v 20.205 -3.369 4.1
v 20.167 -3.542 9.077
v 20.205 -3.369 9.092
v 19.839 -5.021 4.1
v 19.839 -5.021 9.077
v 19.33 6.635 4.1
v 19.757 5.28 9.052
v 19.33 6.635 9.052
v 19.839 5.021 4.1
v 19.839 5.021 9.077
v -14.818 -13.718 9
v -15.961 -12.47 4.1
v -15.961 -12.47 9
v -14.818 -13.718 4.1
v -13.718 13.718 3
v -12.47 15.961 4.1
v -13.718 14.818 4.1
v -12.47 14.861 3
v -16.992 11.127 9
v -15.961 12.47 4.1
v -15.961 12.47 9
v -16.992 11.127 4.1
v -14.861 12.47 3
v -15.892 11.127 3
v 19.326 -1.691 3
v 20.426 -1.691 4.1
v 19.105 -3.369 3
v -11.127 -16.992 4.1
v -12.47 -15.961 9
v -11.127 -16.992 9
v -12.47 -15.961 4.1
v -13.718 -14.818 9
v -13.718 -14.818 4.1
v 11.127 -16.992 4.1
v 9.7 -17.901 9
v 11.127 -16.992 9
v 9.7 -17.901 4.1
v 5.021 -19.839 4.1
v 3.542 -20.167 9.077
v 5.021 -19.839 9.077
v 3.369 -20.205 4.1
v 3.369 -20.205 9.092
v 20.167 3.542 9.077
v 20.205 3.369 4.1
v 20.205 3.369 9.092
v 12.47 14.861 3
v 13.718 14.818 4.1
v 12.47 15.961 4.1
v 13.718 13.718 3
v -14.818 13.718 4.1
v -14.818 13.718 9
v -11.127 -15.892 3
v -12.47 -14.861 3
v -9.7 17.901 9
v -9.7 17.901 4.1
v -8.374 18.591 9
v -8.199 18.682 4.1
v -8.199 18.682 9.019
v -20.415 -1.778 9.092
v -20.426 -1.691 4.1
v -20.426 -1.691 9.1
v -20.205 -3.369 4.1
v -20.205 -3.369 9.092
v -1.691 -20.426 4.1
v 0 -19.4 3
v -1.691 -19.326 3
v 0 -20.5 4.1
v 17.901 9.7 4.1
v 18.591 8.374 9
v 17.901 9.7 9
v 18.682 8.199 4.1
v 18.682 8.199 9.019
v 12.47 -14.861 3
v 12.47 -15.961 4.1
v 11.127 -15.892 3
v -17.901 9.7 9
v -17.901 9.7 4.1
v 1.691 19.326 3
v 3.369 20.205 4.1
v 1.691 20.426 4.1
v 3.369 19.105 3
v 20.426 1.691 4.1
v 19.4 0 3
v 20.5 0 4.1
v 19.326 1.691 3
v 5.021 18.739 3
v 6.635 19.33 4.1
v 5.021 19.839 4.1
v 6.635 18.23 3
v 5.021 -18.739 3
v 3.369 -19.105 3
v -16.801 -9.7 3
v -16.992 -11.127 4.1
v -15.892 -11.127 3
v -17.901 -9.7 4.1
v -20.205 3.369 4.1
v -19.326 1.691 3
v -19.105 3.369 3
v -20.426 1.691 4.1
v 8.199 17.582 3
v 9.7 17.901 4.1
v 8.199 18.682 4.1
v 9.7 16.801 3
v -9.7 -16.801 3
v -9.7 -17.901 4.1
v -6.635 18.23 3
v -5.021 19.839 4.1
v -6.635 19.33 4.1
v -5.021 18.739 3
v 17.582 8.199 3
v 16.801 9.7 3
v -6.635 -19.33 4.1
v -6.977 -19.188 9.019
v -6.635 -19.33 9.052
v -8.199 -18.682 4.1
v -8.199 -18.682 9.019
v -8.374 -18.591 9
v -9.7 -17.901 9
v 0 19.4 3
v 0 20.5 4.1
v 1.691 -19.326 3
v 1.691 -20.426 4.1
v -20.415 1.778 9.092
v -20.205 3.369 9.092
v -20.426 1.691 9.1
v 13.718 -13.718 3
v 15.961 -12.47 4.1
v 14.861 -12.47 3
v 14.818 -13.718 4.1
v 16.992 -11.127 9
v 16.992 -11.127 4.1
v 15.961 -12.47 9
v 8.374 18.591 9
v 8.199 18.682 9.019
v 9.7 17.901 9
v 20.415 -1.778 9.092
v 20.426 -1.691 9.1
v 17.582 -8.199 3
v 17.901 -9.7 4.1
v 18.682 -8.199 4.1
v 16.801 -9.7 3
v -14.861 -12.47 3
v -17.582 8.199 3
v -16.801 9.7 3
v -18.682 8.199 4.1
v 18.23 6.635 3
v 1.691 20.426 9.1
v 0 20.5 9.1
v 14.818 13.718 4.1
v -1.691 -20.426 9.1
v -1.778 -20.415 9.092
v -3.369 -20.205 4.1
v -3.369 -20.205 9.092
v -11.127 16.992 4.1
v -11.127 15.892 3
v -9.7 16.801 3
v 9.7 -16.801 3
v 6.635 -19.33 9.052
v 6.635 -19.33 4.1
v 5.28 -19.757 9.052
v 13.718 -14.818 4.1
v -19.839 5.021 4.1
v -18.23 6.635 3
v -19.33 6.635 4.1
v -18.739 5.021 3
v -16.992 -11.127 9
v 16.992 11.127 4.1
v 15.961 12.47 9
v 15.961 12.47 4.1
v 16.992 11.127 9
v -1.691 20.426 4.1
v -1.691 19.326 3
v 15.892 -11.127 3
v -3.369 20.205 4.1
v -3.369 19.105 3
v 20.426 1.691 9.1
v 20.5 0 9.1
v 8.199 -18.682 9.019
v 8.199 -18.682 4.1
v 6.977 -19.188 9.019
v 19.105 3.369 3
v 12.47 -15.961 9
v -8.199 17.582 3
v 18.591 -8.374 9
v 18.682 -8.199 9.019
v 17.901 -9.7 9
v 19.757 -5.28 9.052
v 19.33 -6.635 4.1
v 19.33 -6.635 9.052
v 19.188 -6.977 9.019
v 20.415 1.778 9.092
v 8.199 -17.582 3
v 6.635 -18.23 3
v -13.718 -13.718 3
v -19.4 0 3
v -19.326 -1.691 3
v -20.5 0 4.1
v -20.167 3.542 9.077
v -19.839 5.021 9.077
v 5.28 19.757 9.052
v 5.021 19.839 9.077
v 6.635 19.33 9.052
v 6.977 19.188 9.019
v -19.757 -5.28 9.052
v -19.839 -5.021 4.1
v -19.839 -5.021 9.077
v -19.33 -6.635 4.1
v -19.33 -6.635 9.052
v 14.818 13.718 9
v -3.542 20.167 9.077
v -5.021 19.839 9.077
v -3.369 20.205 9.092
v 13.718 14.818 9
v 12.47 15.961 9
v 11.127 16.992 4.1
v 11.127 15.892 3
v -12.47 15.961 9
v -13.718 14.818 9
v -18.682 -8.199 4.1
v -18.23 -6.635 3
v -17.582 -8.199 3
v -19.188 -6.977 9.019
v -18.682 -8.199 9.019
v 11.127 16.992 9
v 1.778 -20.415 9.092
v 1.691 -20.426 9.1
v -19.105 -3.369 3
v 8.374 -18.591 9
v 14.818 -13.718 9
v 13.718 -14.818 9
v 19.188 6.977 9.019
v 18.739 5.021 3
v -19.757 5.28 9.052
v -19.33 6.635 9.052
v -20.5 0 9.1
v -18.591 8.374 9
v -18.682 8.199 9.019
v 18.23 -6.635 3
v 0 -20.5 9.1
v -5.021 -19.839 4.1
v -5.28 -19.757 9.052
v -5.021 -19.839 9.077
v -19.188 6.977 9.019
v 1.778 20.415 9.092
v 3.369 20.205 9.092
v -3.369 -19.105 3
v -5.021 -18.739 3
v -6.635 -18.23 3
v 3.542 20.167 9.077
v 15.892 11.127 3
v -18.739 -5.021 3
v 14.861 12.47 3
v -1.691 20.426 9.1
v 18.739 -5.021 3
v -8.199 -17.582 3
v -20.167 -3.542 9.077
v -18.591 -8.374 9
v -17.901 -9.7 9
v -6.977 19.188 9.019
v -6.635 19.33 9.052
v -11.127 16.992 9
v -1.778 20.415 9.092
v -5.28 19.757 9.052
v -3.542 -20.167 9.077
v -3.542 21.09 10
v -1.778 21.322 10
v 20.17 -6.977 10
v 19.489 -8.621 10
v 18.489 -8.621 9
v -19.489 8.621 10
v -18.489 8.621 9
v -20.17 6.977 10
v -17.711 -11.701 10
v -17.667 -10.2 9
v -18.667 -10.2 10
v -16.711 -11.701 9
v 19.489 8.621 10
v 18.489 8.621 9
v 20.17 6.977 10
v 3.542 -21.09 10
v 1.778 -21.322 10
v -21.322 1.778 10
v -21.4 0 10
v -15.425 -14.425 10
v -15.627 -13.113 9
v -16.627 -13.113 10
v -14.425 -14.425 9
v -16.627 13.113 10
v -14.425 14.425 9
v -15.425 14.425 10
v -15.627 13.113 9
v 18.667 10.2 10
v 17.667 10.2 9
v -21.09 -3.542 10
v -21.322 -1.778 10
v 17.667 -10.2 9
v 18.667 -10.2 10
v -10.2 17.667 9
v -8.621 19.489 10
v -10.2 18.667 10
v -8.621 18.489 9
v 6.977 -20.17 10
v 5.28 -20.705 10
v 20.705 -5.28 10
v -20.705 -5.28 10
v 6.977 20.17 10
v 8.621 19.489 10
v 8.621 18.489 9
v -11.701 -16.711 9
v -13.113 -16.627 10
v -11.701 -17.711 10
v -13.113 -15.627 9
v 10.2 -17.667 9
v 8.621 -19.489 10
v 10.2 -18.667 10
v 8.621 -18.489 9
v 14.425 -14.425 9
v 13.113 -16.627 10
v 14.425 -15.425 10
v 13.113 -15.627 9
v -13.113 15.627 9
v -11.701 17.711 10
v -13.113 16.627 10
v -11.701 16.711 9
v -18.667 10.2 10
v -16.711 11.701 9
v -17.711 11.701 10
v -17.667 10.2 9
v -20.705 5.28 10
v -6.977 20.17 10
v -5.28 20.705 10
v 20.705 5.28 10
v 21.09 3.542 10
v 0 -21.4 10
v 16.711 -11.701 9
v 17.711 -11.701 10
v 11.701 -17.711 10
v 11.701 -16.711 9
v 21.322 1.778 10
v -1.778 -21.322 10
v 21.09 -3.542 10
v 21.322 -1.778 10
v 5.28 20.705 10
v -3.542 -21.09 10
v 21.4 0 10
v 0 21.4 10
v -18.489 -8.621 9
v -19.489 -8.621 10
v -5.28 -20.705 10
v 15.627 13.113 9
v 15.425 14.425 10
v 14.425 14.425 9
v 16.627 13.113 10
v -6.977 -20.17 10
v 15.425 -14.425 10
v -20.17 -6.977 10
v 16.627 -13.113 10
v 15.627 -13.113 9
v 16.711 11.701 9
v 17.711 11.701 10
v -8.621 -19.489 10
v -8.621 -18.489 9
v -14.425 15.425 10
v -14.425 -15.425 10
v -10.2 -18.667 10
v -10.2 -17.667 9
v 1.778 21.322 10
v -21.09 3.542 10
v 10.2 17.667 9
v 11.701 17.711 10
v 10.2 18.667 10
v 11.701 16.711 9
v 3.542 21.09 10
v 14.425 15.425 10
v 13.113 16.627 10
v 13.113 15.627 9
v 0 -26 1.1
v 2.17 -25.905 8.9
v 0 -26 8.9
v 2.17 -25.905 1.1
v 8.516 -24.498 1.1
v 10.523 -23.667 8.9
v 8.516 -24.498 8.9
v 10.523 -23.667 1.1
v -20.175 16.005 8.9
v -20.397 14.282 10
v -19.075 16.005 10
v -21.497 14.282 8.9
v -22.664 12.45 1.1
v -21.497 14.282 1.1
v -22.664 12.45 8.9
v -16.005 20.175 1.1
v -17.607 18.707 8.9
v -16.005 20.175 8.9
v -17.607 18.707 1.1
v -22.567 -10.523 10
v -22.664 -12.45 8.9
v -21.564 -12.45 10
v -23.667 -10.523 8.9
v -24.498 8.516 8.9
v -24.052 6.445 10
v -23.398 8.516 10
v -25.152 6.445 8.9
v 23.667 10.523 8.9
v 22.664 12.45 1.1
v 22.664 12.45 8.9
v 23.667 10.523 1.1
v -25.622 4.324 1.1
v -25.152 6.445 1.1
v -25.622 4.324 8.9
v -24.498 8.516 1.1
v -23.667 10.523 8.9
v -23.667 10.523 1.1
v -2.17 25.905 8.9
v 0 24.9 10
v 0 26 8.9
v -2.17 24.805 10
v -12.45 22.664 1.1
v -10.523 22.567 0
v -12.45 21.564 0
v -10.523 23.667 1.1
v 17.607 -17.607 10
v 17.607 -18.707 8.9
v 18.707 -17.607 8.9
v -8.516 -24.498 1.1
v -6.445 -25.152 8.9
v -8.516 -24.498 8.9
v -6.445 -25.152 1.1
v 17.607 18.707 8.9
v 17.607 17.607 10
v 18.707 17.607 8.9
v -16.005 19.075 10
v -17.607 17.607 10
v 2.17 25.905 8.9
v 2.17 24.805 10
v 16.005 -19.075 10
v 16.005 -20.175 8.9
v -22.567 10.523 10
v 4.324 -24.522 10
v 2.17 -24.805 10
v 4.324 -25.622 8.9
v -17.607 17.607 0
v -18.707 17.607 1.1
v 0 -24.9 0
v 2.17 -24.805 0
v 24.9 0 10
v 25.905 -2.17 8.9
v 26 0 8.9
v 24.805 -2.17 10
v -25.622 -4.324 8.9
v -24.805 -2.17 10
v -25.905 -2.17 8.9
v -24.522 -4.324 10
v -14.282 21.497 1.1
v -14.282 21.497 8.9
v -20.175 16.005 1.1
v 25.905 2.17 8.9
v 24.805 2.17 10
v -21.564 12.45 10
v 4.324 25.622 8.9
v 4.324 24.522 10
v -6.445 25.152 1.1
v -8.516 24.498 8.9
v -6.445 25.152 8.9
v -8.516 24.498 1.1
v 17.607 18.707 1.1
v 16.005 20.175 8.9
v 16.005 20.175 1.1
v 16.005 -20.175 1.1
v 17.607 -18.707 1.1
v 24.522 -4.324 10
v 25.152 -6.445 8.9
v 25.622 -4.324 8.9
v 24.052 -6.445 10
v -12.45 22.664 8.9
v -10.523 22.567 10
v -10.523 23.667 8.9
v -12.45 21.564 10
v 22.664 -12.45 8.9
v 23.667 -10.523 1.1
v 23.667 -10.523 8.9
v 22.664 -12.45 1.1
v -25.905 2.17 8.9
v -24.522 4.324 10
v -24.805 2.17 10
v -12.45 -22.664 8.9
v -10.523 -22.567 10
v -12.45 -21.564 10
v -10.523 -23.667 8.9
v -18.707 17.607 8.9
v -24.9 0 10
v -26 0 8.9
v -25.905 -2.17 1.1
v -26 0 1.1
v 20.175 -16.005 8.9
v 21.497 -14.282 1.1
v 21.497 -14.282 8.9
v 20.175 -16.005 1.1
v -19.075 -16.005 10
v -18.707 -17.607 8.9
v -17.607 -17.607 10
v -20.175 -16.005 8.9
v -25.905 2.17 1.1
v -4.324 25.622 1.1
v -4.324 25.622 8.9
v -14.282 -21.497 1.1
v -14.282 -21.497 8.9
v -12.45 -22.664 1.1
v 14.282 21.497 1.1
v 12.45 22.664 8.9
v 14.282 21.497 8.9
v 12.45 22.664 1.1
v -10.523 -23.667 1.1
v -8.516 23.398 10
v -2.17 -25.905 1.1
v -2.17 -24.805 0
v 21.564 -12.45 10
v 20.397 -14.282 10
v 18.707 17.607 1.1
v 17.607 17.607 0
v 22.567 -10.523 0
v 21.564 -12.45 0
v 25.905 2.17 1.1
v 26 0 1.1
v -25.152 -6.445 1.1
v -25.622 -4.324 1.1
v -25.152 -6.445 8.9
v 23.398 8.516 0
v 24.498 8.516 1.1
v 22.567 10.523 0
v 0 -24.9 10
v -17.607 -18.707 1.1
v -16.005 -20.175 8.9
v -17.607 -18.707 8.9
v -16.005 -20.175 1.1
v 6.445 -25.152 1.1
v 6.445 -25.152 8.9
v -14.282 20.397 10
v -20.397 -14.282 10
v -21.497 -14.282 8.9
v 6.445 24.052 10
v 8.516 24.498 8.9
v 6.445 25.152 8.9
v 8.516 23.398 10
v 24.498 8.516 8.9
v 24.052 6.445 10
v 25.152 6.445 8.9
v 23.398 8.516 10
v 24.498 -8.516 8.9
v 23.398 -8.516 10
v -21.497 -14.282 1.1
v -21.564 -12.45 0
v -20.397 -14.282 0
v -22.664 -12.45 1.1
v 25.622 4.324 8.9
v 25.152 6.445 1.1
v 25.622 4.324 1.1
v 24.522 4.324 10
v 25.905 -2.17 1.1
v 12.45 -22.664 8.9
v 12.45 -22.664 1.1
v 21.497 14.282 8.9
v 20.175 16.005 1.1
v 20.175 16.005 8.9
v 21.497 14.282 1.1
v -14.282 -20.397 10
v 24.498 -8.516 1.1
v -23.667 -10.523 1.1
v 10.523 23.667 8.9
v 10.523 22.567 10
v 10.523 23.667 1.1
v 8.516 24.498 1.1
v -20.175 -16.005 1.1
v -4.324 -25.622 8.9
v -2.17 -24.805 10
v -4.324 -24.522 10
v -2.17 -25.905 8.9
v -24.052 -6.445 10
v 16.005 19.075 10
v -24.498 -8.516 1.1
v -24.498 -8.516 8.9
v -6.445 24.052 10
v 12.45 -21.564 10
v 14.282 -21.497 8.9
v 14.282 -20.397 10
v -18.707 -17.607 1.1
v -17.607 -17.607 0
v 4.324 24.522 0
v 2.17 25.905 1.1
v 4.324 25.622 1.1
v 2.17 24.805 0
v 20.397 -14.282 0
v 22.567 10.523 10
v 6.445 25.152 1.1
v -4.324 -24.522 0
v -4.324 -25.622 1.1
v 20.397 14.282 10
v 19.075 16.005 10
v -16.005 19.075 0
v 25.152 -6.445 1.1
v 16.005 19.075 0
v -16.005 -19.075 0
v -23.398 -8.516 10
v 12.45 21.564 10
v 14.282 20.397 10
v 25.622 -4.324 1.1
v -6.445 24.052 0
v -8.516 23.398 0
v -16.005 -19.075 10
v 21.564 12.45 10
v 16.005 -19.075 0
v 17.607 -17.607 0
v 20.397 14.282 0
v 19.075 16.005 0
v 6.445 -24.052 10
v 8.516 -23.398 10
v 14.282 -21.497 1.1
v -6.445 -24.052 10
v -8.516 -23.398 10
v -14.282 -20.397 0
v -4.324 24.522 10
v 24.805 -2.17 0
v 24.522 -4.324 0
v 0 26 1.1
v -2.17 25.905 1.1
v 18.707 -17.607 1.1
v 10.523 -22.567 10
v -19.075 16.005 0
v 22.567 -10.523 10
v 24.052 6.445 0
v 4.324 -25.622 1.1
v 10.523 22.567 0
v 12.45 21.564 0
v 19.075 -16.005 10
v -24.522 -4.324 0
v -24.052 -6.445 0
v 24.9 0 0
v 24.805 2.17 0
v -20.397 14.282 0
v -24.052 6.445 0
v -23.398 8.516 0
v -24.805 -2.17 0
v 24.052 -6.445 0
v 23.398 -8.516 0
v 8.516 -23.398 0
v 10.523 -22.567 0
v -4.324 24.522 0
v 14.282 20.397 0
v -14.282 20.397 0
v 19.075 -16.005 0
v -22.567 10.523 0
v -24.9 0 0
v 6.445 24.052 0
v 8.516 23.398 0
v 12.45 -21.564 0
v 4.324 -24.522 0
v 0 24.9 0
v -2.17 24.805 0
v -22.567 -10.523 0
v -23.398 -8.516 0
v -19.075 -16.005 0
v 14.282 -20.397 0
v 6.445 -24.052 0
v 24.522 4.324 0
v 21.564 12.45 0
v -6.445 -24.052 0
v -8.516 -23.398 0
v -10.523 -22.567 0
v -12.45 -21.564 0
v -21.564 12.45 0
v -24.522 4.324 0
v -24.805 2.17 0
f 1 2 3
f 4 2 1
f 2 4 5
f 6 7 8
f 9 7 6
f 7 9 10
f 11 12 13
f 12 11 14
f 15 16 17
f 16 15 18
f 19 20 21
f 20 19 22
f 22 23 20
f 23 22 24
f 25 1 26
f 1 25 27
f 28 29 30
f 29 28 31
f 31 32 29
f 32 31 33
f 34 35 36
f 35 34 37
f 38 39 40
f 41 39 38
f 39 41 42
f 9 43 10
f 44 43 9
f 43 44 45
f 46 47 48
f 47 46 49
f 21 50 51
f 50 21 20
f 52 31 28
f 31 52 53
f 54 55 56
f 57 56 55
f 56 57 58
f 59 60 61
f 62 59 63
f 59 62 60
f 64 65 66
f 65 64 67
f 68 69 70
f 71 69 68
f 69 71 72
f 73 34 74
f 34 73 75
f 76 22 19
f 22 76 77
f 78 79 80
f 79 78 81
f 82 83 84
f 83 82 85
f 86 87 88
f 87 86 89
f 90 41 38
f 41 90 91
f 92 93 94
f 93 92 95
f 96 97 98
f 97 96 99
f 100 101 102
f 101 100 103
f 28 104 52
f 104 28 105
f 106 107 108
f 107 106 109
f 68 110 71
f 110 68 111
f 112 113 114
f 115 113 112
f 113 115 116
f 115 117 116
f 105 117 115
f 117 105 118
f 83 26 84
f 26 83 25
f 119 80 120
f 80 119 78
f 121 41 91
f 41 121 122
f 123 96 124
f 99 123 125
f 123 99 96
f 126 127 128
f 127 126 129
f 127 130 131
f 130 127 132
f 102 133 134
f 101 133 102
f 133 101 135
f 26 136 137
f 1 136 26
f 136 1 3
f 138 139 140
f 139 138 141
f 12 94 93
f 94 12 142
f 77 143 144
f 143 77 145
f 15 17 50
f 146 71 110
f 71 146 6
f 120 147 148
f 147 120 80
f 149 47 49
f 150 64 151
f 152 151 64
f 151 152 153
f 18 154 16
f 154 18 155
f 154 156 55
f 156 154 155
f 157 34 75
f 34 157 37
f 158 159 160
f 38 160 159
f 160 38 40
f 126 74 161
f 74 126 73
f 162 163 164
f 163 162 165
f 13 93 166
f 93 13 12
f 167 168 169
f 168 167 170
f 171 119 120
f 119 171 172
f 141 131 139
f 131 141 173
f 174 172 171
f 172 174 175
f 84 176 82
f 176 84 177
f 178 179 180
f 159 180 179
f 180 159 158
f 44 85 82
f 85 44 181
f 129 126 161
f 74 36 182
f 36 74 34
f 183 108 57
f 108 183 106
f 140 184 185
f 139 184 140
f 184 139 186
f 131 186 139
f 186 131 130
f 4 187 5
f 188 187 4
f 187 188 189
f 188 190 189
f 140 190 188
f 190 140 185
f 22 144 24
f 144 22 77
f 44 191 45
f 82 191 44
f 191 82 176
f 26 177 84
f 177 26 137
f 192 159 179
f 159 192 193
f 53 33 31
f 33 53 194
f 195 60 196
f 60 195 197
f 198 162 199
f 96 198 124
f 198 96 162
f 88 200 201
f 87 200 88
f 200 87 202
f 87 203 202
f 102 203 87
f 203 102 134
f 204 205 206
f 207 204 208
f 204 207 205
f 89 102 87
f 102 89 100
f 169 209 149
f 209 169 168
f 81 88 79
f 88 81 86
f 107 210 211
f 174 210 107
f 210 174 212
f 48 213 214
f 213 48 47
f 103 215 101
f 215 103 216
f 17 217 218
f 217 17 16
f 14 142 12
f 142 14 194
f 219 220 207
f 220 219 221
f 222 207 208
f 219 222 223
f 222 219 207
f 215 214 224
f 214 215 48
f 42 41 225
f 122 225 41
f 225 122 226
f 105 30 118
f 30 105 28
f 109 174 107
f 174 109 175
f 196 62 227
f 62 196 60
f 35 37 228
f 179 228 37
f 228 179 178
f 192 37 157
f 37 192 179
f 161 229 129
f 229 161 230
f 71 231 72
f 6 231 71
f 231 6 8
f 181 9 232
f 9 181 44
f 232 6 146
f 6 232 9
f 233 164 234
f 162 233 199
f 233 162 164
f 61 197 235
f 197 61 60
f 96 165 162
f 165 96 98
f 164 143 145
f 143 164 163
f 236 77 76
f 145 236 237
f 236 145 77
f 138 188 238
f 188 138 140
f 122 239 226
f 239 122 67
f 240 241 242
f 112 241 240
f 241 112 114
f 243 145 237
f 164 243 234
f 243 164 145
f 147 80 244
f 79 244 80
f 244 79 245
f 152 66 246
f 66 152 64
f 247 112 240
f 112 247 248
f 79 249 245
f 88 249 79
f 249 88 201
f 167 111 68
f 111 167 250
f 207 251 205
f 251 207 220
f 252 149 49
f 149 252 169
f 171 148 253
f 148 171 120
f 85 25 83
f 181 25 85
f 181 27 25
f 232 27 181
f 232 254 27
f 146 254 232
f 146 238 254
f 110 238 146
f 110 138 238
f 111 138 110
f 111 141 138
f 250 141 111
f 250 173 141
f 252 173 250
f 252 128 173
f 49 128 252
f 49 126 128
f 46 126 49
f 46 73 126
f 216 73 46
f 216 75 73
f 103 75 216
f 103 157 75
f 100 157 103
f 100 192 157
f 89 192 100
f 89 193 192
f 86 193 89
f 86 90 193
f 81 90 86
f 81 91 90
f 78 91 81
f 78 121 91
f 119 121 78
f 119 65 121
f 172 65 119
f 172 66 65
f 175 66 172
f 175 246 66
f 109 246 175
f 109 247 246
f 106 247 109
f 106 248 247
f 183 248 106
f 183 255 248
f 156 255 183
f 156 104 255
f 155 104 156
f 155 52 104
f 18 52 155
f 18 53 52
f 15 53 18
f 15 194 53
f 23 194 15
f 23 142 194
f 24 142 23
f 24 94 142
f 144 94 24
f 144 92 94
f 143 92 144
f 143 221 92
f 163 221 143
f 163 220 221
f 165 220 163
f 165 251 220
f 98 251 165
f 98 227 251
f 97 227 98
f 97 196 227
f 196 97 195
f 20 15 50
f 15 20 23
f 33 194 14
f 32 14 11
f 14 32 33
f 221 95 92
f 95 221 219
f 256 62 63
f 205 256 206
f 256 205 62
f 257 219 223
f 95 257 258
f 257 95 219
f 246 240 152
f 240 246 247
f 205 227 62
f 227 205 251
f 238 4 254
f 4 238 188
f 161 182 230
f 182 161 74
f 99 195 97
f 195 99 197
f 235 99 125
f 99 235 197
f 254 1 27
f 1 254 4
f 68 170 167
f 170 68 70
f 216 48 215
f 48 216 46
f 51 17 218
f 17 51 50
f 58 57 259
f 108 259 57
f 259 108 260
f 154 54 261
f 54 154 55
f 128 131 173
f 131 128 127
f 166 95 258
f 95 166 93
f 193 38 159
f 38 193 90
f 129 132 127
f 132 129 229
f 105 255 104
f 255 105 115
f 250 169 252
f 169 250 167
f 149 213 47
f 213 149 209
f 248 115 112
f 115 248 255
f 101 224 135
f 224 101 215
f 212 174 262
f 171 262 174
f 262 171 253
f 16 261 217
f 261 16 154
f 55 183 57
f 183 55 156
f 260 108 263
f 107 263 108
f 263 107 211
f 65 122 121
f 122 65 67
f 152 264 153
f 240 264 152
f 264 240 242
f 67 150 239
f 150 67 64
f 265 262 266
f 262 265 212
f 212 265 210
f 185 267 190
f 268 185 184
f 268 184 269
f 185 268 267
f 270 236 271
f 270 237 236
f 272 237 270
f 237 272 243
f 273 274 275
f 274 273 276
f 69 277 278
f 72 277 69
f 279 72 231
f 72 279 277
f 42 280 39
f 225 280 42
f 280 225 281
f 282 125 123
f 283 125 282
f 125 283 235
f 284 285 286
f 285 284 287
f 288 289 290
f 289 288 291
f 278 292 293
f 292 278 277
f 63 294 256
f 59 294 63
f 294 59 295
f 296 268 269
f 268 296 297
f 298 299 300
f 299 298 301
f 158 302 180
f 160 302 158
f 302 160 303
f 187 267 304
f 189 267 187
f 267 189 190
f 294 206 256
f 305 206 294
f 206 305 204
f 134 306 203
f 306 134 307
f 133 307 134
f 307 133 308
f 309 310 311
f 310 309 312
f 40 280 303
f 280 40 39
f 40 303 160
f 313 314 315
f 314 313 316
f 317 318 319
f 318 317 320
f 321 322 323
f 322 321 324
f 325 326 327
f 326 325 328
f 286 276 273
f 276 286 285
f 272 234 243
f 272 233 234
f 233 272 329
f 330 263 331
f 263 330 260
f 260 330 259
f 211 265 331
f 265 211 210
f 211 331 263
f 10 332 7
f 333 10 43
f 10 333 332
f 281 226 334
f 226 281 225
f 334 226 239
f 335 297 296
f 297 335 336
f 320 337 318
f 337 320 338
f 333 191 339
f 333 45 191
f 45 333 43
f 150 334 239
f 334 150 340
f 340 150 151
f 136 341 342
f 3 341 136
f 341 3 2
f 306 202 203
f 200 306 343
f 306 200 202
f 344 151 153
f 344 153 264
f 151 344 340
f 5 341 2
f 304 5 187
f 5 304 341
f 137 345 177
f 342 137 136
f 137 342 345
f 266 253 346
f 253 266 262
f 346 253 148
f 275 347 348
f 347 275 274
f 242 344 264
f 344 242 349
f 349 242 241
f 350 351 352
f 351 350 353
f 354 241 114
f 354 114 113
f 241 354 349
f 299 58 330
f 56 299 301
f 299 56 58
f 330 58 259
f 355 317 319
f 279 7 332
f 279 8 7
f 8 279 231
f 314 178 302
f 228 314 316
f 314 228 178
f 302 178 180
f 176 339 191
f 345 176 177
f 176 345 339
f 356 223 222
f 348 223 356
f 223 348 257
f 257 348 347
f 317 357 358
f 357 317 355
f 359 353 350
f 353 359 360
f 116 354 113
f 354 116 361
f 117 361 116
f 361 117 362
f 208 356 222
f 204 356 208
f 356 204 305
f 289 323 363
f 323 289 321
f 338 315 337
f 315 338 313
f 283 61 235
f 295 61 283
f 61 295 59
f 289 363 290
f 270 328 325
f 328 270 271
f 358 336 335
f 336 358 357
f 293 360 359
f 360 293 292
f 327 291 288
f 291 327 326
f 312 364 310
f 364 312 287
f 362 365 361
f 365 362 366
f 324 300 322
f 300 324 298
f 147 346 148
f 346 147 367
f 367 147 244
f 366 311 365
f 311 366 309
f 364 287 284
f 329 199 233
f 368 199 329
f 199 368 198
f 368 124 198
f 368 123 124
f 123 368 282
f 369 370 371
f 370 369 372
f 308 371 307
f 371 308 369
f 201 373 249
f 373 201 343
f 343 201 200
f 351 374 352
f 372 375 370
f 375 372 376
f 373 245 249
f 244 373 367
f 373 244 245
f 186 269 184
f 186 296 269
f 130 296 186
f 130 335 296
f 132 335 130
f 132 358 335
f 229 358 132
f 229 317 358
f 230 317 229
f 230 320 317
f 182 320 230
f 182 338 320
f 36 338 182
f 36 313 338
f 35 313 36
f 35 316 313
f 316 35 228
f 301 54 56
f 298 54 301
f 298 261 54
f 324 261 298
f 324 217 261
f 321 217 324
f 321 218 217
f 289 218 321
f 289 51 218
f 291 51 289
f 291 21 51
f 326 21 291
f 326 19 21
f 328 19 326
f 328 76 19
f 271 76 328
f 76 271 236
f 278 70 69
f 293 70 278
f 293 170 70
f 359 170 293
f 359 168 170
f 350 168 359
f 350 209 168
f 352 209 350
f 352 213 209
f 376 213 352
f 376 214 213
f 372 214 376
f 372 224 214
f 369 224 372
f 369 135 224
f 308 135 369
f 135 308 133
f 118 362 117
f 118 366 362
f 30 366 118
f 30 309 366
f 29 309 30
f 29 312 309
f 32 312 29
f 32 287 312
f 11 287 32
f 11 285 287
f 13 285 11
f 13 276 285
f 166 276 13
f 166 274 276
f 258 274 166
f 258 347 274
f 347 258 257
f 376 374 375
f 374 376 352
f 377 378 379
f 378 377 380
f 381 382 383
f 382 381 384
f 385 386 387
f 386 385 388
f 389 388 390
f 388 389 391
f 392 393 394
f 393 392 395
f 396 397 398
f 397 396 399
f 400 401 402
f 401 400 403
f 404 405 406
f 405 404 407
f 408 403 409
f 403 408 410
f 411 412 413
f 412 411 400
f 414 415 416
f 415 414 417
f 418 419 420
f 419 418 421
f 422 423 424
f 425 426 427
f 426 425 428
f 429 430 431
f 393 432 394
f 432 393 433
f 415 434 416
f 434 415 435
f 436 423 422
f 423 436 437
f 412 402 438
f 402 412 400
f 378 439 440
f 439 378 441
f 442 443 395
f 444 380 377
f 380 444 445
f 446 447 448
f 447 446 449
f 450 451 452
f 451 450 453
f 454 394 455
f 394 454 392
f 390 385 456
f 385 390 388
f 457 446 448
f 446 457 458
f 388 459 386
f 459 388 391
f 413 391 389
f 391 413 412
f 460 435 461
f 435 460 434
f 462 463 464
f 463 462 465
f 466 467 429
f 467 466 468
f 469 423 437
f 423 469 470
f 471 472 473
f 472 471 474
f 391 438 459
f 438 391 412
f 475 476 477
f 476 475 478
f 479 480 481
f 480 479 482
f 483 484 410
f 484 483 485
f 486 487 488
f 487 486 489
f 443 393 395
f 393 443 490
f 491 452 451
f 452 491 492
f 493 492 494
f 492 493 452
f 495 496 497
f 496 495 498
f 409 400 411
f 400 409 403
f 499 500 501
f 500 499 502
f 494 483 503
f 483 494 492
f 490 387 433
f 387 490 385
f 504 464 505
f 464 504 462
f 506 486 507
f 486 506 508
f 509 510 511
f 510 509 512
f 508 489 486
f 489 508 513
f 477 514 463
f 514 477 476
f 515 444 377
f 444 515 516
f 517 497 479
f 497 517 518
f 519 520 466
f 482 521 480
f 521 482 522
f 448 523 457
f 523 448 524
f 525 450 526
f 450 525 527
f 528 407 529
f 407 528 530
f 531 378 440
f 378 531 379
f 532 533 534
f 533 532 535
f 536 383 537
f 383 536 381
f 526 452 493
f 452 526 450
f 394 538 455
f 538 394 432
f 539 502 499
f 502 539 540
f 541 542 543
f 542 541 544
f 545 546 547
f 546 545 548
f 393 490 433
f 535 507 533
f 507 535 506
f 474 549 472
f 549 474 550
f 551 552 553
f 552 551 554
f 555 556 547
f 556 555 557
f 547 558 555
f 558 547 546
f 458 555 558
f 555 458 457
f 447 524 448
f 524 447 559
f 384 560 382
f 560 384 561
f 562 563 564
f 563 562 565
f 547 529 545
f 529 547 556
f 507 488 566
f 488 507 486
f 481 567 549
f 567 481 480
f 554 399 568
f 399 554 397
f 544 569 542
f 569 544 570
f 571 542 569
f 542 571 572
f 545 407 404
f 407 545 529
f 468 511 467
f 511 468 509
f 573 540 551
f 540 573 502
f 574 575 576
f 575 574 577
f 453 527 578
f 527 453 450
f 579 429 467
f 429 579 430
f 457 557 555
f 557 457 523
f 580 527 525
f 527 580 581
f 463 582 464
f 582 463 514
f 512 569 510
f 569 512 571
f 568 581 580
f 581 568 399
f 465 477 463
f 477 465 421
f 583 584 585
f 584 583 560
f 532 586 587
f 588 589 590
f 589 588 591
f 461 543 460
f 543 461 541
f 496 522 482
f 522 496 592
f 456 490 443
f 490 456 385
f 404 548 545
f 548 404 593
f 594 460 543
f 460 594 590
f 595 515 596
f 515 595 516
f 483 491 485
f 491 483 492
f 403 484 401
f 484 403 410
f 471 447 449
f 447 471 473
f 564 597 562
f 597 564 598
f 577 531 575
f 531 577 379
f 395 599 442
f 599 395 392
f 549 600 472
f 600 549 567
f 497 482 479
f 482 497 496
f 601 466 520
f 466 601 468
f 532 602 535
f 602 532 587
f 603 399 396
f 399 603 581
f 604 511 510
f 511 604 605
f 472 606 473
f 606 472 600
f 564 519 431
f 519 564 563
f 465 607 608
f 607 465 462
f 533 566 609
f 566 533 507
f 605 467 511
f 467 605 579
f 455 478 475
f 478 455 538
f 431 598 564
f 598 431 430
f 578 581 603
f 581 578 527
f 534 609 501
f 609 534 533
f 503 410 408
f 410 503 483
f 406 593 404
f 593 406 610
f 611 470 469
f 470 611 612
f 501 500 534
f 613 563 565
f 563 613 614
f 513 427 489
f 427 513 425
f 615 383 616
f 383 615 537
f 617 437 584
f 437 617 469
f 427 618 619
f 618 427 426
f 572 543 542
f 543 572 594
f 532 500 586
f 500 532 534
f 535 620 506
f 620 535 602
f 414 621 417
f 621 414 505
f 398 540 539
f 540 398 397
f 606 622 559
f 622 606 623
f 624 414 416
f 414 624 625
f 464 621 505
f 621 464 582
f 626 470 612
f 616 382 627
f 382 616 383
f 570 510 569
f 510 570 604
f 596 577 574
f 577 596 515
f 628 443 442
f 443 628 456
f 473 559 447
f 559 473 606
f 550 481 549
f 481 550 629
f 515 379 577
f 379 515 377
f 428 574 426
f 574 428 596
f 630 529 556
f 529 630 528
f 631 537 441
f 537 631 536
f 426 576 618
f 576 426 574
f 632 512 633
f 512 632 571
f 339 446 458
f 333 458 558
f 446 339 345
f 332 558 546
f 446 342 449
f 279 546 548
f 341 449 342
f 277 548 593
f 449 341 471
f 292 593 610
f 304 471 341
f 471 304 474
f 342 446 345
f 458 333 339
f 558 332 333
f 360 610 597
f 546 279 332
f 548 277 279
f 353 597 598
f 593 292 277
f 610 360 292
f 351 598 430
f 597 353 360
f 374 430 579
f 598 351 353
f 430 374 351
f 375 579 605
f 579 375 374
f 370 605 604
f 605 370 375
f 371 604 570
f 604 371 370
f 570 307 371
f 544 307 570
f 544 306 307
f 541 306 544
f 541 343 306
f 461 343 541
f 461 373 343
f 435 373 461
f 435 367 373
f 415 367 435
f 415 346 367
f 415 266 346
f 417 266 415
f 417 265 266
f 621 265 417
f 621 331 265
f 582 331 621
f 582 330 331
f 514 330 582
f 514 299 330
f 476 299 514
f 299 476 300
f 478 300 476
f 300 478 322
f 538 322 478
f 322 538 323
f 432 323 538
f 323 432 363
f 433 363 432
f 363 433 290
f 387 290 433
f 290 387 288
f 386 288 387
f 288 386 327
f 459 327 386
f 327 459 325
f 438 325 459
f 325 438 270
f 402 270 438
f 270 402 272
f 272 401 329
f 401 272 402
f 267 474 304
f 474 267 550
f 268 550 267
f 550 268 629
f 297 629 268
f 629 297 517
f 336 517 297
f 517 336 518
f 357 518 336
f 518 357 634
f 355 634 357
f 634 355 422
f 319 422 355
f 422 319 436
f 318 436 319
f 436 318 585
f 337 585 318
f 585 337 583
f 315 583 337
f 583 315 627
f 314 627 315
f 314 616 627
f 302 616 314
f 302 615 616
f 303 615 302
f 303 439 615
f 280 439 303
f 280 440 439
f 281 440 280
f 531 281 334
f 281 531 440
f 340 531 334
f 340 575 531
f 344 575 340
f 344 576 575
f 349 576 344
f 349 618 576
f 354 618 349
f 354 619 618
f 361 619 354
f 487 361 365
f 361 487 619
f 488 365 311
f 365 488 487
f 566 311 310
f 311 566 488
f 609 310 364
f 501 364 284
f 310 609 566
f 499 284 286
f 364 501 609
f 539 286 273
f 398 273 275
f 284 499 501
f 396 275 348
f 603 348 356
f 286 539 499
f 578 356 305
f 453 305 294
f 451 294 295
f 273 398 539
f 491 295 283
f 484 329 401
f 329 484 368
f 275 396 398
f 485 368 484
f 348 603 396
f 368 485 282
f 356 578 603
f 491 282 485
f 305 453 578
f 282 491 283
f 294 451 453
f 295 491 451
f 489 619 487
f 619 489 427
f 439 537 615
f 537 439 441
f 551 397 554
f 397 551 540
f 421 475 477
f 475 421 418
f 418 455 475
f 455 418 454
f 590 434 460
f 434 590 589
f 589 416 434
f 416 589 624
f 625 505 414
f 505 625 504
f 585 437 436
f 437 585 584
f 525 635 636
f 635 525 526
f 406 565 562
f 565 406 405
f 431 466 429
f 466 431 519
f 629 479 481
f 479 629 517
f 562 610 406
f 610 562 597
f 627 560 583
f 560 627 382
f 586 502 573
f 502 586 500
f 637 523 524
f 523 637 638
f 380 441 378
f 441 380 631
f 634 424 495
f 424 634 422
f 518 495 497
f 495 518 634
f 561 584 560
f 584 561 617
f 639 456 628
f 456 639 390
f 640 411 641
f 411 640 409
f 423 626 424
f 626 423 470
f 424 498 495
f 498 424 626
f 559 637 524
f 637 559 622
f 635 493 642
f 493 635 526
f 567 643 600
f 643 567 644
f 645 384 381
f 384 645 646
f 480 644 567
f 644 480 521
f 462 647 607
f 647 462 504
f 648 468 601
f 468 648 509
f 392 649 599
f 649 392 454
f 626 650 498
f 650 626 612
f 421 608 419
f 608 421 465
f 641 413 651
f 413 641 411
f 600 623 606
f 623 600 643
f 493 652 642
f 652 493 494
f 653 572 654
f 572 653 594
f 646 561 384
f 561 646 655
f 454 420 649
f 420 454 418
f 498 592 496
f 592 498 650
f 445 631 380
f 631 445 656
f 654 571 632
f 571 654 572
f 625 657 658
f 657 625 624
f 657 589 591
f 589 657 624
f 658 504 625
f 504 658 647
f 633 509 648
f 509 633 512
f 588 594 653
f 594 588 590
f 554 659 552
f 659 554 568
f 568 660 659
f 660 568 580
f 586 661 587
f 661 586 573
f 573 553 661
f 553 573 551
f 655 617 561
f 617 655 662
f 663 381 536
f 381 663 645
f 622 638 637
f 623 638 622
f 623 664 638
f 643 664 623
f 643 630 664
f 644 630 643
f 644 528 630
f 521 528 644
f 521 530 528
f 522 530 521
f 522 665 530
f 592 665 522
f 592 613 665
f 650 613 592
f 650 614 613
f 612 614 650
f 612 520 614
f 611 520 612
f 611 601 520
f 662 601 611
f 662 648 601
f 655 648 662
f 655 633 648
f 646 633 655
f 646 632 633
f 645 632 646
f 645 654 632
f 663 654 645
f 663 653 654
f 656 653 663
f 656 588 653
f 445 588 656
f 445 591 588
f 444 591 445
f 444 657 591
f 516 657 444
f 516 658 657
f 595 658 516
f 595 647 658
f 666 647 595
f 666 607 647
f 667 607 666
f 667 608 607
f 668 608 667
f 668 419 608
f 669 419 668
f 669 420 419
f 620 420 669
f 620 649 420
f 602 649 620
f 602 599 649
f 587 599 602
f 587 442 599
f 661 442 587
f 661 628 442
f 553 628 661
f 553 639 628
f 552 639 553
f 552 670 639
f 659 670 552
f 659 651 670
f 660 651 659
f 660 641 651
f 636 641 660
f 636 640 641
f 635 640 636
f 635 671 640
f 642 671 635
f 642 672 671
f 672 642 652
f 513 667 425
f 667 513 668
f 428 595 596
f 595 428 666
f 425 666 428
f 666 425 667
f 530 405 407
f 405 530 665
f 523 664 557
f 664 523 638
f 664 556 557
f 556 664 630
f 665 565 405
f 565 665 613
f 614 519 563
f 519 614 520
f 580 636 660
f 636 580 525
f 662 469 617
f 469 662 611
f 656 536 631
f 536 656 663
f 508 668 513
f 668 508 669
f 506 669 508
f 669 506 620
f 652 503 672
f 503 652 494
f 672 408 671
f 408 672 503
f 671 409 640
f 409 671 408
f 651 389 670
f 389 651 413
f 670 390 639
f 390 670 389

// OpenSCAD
// file: common.scad
// Unless otherwise specified, each resulting shape is
// resting on the XY plane, centered on the Z axis.

// A small amount to make sure shapes overlap when needed. This
// is well below the resolution of my 3D printer, so it
// shouldn't affect the final result.
eps = 0.001;

// High quality for printing.
$fa = 5;
$fs = 0.4;

module repeatx(n, spacing) {
  for (i = [1:n])
    translate([(i-1)*spacing, 0, 0])
      children();
}

module repeaty(n, spacing) {
  for (i = [1:n])
    translate([0, (i-1)*spacing, 0])
      children();
}

// A square pyramid, 1mm wide and 0.5mm tall. Each side of
// the base is centered on an axis.
module pyramid() {
  linear_extrude(0.5, scale=0)
    square(1, center=true);
}

// A regular octahedron centered on the origin with its
// vertices on the axes. 'axis' gives its full length along
// each axis.
module octahedron(axis) {
  // Top and bottom halves.
  for (a = [-1, 1])
    scale([1, 1, a])
      // Extrude a square into a pyramid.
      linear_extrude(axis/2, scale=0)
        rotate([0, 0, 45])
          square(norm([axis/2, axis/2]), center=true);
}

// 'd' is the outer dimensions of the box.
module chamfered_box(d, chamfer=0.5) {
  assert(d.x >= chamfer*2);
  assert(d.y >= chamfer*2);
  assert(d.z >= chamfer*2);

  // Raise the result up so it is resting on the XY plane.
  translate([0, 0, d.z/2]) {
    minkowski() {
      // The desired cube, scaled back by the chamfer distance
      // in all directions.
      cube(d - [chamfer*2, chamfer*2, chamfer*2], center=true);
      octahedron(chamfer*2);
    }
  }
}

module chamfered_disk(height, radius) {
  // Chamfer base disks and chips more aggressively.
  chamfer = 1.1;
  assert(radius >= chamfer);
  assert(height >= chamfer*2);

  // Raise the result up so it is resting on the XY plane.
  translate([0, 0, height/2]) {
    minkowski() {
      // The desired disk, scaled back by the chamfer distance
      // in all directions.
      cylinder(height-chamfer*2, r=radius-chamfer, center=true);
      octahedron(chamfer*2);
    }
  }
}

locking_lug_dims = [2.3, 2.3, 1.8+2*eps];

// A snug fit for gluing.
module locking_lug() {
  // Taper the lug slightly, to counteract the printing effect
  // which spreads the top layer slightly.
  linear_extrude(locking_lug_dims.z, scale=0.95)
    square([locking_lug_dims.x, locking_lug_dims.y],
            center=true);
}

// Make extra sure the lug will fit all the way into the hole.
locking_socket_extra_depth = 0.7;

module locking_socket_top() {
  extra_depth = 0.15;
  translate([
    0, 0,
    -(
       locking_lug_dims.z+locking_socket_extra_depth+extra_depth
    )/2+eps
  ]) {
    cube(locking_lug_dims + [
      0.15, 0.15,
      locking_socket_extra_depth+extra_depth
    ], center=true);
  }
}

module locking_socket_bottom() {
  translate([
    0, 0,
    (locking_lug_dims.z+locking_socket_extra_depth)/2-eps
  ]) {
    cube(locking_lug_dims + [
      // When printing this on the bottom of a model, it
      // needs to be a bit wider to account for
      // elephant-foot.
      0.3, 0.3,
      locking_socket_extra_depth
    ], center=true);
  }
}

// A pin which can be used to join two locking sockets.
module locking_pin() {
  dims = [
    locking_lug_dims.x-0.2,
    // Lay the pin on its side for more reliable printing.
    locking_lug_dims.z*2 + locking_socket_extra_depth/2,
    locking_lug_dims.y-0.2,
  ];
  translate([0, 0, dims.z/2]) {
    difference() {
      cube(dims, center=true);
      
      // A slight bottom chamfer to combat elephant-foot.
      for (a = [-1, 1])
        scale([a, 1, 1])
          translate([dims.x/2, -eps, -dims.z/2-1.3])
            rotate([0, 45, 0])
              cube([dims.x, dims.y+3*eps, dims.z], center=true);
    }
  }
}

// Arranges children in square pattern.
module arrange(spacing) {
  s = ceil(sqrt($children));
  for (a = [0:s-1], b = [0:s-1]) {
    c = a + b*s;
    x = a - s/2 + 0.5;
    y = b - s/2 + 0.5;
    if (c < $children)
      translate([x*spacing, y*spacing, 0])
        children(c);
  }
}
// main file
include <common.scad>

// TODO:
if (false) {
difference() {
  union() {
    // Exterior.
    hull()
      for (a = [-1, 1], b = [-1, 1])
        translate([68*a, 68*b, 0])
          chamfered_disk(75, 25);
      
    // Crenellations.
    for (a = [0, 90, 180, 270]) {
      rotate([0, 0, a]) {
        translate([88, 0, 65.7]) {
          intersection() {
            cube([21.8, 100, 100], center=true);
            rotate([0, 45, 0]) {
              chamfered_box([7, 40, 30], chamfer=1.1);
            }
          }
          translate([8.75, 0, 6])
            chamfered_box([6.5, 40, 12], chamfer=1.1);
        }
      }
    }
  }

  // Main interior volume.
  hull()
    for (a = [-1, 1], b = [-1, 1])
      translate([67*a, 67*b, 50])
        cylinder(80, r=22, center=true);
    
  // Chamfer on inner top edge.
  hull()
    for (a = [-1, 1], b = [-1, 1])
      translate([67*a, 67*b, 73.9])
        chamfered_disk(100, 23);

  // Sockets.
  translate([-67.5, -67.5, 3]) {
    repeatx(4, 45) {
      repeaty(4, 45) {
        chamfered_disk(10, 20.5);
        translate([0, 0, 6])
          chamfered_disk(10, 21.5);
      }
    }
  }
}
}

// TODO: just a test
difference() {
  chamfered_disk(10, 26);
  translate([0, 0, 3]) {
    chamfered_disk(10, 20.5);
    translate([0, 0, 6])
      chamfered_disk(10, 21.5);
  }
}
